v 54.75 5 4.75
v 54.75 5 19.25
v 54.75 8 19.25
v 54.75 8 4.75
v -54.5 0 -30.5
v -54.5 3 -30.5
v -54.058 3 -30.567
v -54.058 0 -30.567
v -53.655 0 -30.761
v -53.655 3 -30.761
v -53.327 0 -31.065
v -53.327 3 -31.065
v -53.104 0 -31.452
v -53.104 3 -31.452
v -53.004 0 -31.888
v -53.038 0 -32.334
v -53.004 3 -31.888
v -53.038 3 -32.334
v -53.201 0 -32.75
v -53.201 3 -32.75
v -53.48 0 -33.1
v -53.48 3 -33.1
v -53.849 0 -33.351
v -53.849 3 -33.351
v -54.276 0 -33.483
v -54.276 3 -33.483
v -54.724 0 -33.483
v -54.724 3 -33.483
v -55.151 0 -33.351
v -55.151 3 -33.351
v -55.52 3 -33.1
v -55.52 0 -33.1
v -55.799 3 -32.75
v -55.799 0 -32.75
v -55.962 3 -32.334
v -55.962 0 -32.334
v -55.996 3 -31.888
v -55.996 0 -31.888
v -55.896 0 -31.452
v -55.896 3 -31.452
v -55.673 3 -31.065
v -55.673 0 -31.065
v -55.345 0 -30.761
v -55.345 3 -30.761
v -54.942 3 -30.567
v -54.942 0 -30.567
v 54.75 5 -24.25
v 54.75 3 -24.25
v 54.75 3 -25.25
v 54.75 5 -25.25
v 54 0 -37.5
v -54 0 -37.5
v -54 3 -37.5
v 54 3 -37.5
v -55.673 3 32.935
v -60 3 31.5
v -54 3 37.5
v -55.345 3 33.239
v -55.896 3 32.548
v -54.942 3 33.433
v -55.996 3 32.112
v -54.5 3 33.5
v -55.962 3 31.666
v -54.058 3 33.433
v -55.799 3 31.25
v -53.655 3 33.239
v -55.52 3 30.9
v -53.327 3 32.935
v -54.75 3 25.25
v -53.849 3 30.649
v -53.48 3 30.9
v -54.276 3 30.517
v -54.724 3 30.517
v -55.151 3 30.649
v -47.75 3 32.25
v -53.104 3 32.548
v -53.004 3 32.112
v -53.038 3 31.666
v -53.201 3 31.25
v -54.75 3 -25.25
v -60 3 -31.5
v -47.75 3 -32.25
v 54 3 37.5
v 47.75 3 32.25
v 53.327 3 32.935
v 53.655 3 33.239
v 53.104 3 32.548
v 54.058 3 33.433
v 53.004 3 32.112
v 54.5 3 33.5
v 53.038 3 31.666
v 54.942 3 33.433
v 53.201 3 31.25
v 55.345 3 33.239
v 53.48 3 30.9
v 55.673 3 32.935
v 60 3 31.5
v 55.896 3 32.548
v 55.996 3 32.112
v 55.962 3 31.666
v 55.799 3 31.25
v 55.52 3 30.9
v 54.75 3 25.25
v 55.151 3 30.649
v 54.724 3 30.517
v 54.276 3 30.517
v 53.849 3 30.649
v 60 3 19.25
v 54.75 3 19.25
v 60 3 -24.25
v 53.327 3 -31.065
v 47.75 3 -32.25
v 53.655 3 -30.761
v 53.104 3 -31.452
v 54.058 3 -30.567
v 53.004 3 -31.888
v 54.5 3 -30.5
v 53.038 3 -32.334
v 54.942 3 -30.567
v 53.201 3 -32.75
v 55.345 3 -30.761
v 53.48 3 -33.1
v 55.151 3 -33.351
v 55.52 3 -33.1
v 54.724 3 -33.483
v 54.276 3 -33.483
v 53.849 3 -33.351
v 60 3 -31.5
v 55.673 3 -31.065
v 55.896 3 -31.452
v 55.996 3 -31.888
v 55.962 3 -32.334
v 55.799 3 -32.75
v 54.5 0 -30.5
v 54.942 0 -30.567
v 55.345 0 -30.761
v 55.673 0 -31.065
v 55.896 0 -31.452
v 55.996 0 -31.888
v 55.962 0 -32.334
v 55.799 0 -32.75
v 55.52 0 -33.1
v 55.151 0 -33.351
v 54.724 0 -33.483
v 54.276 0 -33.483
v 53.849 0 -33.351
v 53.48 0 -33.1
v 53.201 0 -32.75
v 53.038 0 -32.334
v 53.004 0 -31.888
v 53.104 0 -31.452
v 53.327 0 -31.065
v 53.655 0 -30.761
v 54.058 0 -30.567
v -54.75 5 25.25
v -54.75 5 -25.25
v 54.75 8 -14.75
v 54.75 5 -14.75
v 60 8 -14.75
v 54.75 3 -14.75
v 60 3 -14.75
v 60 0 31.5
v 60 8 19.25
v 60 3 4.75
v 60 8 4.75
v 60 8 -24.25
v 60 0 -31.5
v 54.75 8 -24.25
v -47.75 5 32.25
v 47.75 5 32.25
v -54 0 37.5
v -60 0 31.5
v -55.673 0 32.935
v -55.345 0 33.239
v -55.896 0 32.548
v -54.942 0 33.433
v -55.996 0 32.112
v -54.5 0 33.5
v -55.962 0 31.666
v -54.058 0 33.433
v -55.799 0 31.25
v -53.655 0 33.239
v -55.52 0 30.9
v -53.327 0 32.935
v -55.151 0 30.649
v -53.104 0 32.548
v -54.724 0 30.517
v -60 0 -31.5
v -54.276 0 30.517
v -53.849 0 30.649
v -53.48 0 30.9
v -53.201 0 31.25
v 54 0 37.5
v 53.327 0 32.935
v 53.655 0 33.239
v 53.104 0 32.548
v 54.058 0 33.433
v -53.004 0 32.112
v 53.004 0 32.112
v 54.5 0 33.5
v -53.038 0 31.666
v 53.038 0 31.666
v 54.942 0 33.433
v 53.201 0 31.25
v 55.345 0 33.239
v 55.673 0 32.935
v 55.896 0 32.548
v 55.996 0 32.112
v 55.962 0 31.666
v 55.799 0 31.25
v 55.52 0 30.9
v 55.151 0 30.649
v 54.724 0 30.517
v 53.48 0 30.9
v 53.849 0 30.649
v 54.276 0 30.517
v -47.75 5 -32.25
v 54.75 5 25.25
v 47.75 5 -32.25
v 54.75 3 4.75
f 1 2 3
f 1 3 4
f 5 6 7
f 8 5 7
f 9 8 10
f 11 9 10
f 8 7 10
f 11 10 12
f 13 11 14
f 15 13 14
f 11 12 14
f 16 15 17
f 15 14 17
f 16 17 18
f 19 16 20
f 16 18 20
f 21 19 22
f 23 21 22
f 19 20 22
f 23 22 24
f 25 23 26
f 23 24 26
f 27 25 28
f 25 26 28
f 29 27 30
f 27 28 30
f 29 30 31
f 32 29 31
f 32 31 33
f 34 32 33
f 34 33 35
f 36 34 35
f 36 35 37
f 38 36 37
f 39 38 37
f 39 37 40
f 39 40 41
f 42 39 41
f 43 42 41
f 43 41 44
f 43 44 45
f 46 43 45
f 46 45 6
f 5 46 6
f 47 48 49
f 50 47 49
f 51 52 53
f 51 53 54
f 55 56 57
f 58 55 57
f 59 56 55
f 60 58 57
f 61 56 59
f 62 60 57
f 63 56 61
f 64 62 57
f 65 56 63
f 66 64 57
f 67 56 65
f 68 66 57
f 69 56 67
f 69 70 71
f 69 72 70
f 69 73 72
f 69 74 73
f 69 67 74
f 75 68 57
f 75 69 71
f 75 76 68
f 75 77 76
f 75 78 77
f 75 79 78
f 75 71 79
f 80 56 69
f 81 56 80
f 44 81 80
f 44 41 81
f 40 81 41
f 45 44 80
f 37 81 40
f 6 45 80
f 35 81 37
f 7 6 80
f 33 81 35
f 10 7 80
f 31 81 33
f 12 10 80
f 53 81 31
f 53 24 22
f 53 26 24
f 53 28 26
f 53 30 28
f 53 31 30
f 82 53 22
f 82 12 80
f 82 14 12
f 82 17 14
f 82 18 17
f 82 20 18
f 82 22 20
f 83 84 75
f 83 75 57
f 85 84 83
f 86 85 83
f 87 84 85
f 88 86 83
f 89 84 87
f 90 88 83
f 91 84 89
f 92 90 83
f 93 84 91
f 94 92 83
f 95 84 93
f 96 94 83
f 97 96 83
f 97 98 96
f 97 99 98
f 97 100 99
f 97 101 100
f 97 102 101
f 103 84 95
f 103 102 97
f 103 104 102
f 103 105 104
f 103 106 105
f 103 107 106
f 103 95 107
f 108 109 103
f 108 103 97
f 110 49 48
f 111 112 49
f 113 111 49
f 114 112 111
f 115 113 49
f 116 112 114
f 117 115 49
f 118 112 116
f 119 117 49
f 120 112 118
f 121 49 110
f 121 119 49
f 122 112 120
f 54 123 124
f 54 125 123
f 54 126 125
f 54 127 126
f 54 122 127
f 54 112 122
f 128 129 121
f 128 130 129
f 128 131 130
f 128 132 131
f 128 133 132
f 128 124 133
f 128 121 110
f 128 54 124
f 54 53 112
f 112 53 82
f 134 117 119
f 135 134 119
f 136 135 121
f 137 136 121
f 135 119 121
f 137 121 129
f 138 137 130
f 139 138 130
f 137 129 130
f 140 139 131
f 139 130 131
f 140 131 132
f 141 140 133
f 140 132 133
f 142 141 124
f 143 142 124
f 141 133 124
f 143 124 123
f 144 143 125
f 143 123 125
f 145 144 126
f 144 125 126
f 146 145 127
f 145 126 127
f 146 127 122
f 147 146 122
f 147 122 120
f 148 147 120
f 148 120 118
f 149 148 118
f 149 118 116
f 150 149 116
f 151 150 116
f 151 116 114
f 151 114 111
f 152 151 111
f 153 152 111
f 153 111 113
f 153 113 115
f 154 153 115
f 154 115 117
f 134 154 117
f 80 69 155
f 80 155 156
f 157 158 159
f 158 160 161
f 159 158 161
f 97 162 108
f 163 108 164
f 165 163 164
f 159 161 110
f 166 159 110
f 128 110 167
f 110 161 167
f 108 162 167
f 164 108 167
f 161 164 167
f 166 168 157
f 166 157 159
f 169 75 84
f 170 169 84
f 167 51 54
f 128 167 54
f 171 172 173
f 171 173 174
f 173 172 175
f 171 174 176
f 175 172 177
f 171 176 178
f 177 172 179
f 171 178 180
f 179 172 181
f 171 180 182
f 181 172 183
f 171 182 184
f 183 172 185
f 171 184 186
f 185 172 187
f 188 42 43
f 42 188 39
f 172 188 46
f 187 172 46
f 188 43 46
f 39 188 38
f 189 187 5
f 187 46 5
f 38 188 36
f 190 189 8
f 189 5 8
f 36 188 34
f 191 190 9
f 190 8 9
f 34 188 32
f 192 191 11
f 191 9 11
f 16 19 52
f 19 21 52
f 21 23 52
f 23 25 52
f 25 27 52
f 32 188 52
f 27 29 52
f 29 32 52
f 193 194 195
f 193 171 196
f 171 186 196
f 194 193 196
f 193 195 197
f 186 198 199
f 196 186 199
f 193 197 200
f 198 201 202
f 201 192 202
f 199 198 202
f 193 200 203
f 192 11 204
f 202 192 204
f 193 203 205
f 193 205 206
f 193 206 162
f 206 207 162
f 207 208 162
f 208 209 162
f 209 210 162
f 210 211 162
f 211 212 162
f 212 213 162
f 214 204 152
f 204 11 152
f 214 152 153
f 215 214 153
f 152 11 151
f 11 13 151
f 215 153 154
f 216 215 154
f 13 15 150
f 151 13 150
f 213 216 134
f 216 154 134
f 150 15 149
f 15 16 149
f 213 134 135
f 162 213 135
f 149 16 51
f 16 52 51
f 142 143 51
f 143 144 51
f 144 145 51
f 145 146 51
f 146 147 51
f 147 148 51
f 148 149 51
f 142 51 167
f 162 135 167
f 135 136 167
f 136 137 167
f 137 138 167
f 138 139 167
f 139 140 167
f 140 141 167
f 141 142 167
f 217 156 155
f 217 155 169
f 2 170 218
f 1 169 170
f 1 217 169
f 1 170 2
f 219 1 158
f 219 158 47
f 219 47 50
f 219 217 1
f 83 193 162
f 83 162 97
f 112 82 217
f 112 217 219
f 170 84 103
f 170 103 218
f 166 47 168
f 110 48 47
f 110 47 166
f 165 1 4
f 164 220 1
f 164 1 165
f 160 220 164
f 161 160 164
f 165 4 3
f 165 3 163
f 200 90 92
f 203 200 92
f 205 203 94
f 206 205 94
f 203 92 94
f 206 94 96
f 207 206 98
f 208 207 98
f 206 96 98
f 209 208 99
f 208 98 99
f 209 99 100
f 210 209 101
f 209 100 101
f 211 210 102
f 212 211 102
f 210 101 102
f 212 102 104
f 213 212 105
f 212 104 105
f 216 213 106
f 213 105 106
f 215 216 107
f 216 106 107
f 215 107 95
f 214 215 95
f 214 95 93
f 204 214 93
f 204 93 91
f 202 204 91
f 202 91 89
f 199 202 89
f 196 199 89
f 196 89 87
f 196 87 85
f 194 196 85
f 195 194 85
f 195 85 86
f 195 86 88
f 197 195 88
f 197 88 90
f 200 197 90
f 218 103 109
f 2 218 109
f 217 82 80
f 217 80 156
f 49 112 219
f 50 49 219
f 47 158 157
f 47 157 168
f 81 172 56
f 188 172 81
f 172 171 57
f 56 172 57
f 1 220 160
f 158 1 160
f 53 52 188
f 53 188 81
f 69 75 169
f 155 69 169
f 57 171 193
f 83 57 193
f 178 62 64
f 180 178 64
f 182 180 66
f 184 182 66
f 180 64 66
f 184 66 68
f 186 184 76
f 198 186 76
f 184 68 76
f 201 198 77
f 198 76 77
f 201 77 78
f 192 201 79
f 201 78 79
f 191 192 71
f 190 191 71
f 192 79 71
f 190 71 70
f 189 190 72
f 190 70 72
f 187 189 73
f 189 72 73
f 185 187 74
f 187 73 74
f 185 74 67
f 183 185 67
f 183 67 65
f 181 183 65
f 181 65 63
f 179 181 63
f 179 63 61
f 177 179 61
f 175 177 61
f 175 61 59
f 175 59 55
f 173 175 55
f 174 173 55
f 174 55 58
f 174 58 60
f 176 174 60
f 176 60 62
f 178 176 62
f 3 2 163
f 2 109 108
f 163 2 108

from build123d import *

# Parameters (mm, degrees)
SKETCH1_W           = 120
SKETCH1_H           = 75
BOSS_EXTRUDE1_DEPTH = 3
CHAMFER1_SIZE       = 6
SKETCH2_W           = 109.5
SKETCH2_H           = 64.5
BOSS_EXTRUDE2_DEPTH = 2
CHAMFER2_SIZE       = 7
SKETCH3_R           = 1.5
CUT_EXTRUDE1_DEPTH  = 5
SKETCH4_W           = 5.25
SKETCH4_H           = 9.5
SKETCH4_H_2         = 14.5
BOSS_EXTRUDE3_DEPTH = 5


with BuildPart() as part:
    # Sketch1 → Boss-Extrude1 (new body)
    with BuildSketch(Plane(origin=(0, 0, 0), x_dir=(1, 0, 0), z_dir=(0, 1, 0))):
        Rectangle(SKETCH1_W, SKETCH1_H)
    extrude(amount=BOSS_EXTRUDE1_DEPTH)

    # Chamfer1
    chamfer1_edges = [part.edges().sort_by_distance(p)[0] for p in [
        (60, 1.5, 37.5),
        (-60, 1.5, 37.5),
        (-60, 1.5, -37.5),
        (60, 1.5, -37.5),
    ]]
    chamfer(chamfer1_edges, length=CHAMFER1_SIZE)

    # Sketch2 → Boss-Extrude2 (add)
    with BuildSketch(Plane(origin=(0, 3, 0), x_dir=(1, 0, 0), z_dir=(0, 1, 0))):
        Rectangle(SKETCH2_W, SKETCH2_H)
    extrude(amount=BOSS_EXTRUDE2_DEPTH)

    # Chamfer2
    chamfer2_edges = [part.edges().sort_by_distance(p)[0] for p in [
        (54.75, 4, 32.25),
        (54.75, 4, -32.25),
        (-54.75, 4, -32.25),
        (-54.75, 4, 32.25),
    ]]
    chamfer(chamfer2_edges, length=CHAMFER2_SIZE)

    # Sketch3 → Cut-Extrude1 (cut)
    with BuildSketch(Plane(origin=(0, 3, 0), x_dir=(1, 0, 0), z_dir=(0, 1, 0))):
        with Locations(Location((-54.5, -32, 0), (0, 0, 270))):
            Circle(SKETCH3_R)
        with Locations(Location((-54.5, 32, 0), (0, 0, 270))):
            Circle(SKETCH3_R)
        with Locations(Location((54.5, 32, 0), (0, 0, 270))):
            Circle(SKETCH3_R)
        with Locations(Location((54.5, -32, 0), (0, 0, 270))):
            Circle(SKETCH3_R)
    extrude(amount=-CUT_EXTRUDE1_DEPTH, mode=Mode.SUBTRACT)

    # Sketch4 → Boss-Extrude3 (add)
    with BuildSketch(Plane(origin=(0, 3, 0), x_dir=(1, 0, 0), z_dir=(0, 1, 0))):
        with Locations((57.375, 19.5)):
            Rectangle(SKETCH4_W, SKETCH4_H)
        with Locations((57.375, -12)):
            Rectangle(SKETCH4_W, SKETCH4_H_2)
    extrude(amount=BOSS_EXTRUDE3_DEPTH)


solid = part.part
